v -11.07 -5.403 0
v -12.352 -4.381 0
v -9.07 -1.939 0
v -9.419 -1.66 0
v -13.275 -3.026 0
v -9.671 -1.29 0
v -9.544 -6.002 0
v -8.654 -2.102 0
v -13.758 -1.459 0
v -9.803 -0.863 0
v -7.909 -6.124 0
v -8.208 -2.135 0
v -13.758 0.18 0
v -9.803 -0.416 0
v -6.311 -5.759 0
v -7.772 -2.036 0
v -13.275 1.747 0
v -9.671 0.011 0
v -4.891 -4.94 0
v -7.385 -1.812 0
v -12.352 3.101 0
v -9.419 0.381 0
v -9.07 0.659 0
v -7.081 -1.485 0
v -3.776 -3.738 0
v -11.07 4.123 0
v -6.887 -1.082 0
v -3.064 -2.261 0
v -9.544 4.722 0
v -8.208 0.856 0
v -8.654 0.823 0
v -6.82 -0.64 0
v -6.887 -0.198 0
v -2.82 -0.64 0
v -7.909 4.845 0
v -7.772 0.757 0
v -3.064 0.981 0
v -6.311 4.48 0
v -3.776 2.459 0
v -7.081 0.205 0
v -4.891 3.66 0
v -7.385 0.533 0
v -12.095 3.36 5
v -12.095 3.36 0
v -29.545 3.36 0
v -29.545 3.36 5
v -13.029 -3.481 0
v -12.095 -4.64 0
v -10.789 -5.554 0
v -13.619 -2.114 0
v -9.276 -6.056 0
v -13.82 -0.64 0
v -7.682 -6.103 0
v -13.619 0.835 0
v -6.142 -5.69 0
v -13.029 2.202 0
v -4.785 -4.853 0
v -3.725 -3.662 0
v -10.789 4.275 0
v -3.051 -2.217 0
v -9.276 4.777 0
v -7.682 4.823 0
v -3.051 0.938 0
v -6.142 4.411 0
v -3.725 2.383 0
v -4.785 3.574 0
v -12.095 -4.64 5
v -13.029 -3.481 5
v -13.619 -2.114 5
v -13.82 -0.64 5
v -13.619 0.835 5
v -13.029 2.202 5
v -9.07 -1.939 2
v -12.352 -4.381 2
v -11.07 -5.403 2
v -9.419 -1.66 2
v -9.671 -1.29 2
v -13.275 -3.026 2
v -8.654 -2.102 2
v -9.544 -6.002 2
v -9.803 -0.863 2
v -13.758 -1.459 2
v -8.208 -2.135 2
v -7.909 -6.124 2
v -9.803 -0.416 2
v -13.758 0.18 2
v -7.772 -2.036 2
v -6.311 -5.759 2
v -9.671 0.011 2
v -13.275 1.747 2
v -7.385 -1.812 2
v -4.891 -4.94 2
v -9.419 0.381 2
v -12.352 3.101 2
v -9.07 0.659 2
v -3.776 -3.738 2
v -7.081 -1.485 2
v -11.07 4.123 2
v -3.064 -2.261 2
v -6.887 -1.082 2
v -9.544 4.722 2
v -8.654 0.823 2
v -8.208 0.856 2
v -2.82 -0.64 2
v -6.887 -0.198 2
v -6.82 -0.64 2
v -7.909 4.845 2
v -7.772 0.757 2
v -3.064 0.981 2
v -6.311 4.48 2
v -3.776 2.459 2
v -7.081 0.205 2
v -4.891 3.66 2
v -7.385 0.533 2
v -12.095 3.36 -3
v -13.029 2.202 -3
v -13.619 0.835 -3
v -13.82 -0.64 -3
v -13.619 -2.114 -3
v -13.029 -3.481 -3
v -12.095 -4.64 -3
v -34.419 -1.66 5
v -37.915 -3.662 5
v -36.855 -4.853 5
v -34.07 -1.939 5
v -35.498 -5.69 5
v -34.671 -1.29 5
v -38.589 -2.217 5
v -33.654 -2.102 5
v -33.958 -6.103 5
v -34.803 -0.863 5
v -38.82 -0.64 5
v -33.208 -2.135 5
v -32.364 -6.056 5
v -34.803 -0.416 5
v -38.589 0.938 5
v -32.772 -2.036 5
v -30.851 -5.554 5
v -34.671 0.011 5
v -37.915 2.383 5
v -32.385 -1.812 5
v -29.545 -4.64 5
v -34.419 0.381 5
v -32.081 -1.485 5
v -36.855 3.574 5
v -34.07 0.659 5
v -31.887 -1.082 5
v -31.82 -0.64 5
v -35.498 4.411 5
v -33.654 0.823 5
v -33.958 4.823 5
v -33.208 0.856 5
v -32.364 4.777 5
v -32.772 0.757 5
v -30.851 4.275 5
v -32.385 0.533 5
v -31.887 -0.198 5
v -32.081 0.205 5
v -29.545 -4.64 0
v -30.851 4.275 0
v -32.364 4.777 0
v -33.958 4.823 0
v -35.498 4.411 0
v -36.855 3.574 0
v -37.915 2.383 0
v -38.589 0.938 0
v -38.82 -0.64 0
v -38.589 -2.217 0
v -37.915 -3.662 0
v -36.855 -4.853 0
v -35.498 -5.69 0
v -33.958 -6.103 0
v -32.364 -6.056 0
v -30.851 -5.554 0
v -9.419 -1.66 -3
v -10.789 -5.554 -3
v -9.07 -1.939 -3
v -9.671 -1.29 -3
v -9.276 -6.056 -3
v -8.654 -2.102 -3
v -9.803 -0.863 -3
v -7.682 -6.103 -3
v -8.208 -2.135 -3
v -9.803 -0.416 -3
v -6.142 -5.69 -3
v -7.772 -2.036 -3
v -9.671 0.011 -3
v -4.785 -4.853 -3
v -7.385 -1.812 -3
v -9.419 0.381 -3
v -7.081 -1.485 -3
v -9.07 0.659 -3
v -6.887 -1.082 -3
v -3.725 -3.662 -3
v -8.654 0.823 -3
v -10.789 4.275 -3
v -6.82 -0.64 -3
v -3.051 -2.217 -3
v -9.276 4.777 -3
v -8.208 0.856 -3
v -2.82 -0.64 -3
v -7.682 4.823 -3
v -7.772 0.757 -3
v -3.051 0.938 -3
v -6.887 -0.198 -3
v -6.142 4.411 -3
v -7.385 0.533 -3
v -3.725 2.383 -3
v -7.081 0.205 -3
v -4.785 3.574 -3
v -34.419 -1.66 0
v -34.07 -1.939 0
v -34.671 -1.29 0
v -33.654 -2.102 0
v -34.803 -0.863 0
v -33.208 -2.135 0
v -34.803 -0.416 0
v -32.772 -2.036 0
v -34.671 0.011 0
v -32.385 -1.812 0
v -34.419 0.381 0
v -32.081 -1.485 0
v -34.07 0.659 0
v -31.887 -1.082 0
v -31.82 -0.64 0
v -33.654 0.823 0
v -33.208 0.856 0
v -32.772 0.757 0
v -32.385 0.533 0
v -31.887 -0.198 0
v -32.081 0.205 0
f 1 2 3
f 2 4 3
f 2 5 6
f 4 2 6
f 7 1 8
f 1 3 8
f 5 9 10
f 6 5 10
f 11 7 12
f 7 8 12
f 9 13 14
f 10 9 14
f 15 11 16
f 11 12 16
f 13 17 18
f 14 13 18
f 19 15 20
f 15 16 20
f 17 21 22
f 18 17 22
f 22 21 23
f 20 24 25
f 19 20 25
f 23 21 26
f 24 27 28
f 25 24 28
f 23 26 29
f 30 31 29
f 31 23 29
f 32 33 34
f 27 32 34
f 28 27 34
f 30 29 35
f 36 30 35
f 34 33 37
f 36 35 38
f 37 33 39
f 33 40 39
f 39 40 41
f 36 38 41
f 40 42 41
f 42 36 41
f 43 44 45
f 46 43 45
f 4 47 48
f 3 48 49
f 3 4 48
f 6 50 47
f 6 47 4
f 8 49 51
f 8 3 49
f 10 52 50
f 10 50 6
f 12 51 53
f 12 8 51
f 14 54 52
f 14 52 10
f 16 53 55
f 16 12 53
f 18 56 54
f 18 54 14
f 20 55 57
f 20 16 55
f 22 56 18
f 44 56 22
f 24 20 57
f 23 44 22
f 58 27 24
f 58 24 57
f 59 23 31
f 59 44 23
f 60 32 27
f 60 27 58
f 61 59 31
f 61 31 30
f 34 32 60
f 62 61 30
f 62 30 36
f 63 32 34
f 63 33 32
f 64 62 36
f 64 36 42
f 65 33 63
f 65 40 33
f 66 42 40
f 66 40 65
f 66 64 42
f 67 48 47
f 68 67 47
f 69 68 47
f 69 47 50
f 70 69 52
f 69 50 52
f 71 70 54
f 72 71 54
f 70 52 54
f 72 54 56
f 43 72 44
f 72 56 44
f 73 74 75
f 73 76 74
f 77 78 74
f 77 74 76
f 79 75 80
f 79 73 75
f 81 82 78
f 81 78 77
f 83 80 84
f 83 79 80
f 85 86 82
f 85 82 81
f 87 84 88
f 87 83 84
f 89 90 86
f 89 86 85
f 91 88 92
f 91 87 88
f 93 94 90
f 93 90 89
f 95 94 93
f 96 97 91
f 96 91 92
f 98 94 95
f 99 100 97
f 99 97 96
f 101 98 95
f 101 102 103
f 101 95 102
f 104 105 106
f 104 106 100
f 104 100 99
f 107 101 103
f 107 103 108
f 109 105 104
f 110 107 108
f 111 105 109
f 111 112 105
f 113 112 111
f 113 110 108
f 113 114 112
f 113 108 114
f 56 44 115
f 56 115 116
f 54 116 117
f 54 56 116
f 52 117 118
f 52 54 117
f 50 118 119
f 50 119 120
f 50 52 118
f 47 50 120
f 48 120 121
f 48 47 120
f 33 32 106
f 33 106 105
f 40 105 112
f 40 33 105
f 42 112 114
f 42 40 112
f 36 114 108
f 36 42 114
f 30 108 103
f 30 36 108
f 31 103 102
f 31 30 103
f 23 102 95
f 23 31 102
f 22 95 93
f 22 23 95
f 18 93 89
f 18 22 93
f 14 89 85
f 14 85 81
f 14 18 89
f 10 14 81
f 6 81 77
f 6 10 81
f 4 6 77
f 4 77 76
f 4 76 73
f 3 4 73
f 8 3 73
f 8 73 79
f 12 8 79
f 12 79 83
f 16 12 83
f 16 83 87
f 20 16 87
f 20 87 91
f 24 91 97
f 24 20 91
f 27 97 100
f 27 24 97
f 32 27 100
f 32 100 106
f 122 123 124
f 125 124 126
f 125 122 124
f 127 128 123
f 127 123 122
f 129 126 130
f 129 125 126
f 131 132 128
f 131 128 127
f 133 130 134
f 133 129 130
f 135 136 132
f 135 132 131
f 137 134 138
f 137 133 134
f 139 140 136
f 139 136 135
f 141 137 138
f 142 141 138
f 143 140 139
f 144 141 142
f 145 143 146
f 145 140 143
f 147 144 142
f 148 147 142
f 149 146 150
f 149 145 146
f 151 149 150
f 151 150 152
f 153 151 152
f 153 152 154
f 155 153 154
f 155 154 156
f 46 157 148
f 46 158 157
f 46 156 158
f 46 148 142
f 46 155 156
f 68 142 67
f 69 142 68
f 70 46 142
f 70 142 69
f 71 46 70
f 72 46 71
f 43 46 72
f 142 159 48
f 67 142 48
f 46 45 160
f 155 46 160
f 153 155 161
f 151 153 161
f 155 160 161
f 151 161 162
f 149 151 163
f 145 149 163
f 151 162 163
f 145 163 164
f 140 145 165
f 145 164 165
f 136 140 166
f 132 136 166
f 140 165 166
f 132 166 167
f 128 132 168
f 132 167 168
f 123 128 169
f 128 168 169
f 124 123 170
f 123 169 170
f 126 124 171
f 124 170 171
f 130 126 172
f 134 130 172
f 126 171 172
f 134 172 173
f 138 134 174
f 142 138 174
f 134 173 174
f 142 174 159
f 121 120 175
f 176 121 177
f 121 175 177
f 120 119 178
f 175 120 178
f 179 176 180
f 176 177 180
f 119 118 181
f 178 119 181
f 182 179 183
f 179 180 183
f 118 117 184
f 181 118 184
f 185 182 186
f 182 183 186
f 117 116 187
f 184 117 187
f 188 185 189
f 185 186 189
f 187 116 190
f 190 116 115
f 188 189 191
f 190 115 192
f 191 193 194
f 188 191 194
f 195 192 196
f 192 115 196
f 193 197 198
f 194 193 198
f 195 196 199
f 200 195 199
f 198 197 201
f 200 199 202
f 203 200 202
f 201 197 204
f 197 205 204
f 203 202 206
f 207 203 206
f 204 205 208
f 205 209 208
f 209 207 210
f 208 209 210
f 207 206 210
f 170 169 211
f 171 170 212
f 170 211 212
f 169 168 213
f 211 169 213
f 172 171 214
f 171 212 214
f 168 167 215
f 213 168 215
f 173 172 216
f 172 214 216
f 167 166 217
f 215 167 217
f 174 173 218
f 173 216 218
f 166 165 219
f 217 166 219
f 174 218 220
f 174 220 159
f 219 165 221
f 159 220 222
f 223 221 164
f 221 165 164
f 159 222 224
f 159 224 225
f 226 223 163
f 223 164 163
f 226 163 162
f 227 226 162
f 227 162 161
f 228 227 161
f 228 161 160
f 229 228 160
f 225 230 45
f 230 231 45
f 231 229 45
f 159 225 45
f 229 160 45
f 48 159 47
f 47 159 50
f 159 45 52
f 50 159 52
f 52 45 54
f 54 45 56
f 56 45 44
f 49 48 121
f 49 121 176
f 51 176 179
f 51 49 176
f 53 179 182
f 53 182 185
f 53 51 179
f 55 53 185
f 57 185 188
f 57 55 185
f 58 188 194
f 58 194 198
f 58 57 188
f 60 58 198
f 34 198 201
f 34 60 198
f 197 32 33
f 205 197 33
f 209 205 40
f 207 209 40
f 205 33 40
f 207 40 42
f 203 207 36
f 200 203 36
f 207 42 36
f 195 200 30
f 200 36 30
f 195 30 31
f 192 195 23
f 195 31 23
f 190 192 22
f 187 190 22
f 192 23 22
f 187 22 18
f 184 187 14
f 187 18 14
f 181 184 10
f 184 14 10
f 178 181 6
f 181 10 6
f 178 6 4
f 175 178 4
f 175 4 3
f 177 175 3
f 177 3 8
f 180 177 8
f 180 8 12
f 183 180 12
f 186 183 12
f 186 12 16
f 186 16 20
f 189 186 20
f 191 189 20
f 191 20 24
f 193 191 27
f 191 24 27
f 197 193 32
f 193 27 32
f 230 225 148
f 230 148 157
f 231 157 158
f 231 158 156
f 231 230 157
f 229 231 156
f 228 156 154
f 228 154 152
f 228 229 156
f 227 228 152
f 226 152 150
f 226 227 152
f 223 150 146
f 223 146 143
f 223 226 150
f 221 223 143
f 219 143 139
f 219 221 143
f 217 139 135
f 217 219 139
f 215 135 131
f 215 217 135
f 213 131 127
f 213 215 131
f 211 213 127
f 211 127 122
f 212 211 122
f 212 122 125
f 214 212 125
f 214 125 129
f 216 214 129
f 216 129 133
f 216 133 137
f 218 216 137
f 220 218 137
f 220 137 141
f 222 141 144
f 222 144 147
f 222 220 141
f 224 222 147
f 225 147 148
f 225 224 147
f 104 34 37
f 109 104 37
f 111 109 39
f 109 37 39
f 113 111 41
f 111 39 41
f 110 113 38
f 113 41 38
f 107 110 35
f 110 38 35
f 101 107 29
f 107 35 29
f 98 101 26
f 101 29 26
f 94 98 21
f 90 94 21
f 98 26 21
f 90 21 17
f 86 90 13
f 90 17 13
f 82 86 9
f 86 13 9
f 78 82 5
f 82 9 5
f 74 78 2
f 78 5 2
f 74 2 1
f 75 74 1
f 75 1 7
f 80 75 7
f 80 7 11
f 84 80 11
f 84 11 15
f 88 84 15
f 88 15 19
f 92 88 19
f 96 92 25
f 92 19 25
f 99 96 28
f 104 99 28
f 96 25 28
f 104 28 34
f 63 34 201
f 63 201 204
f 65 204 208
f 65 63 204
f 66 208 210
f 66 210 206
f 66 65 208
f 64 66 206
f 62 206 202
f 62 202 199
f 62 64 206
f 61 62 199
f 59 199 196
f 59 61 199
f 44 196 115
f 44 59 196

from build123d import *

# Parameters (mm, degrees)
F0_R        = 1.5
F1_DEPTH    = 3
F2_DEPTH    = 5
F1_FACE_R   = 5.5
F1_FACE_R_2 = 1.5
F3_DEPTH    = 2


with BuildPart() as f1:
    # F0 (on Top) → F1 (new body)
    with BuildSketch(Plane.XY):
        with BuildLine():
            ThreePointArc((-2.819893, -0.639665), (-6.141825, 4.410683), (-12.09481, 3.360335))
            ThreePointArc((-12.09481, 3.360335), (-13.819893, -0.639665), (-12.09481, -4.639665))
            ThreePointArc((-12.09481, -4.639665), (-6.141825, -5.690014), (-2.819893, -0.639665))
        make_face()
        with Locations((-8.319893, -0.639665)):
            Circle(F0_R, mode=Mode.SUBTRACT)
    extrude(amount=-F1_DEPTH)


with BuildPart() as f2:
    # F0 (on Top) → F2 (new body)
    with BuildSketch(Plane.XY):
        with BuildLine():
            ThreePointArc((-29.544975, 3.360335), (-28.269544, 1.538402), (-27.819893, -0.639665))
            ThreePointArc((-27.819893, -0.639665), (-28.269544, -2.817733), (-29.544975, -4.639665))
            Line((-29.544975, -4.639665), (-29.319893, -4.639665))
            Line((-29.319893, -4.639665), (-12.319893, -4.639665))
            Line((-12.319893, -4.639665), (-12.09481, -4.639665))
            ThreePointArc((-12.09481, -4.639665), (-13.819893, -0.639665), (-12.09481, 3.360335))
            Line((-12.09481, 3.360335), (-12.319893, 3.360335))
            Line((-12.319893, 3.360335), (-29.319893, 3.360335))
            Line((-29.319893, 3.360335), (-29.544975, 3.360335))
        make_face()
        with BuildLine():
            ThreePointArc((-29.544975, -4.639665), (-28.269544, -2.817733), (-27.819893, -0.639665))
            ThreePointArc((-27.819893, -0.639665), (-28.269544, 1.538402), (-29.544975, 3.360335))
            ThreePointArc((-29.544975, 3.360335), (-38.819893, -0.639665), (-29.544975, -4.639665))
        make_face()
        with Locations((-33.319893, -0.639665)):
            Circle(F0_R, mode=Mode.SUBTRACT)
    extrude(amount=F2_DEPTH)


with BuildPart() as f3:
    # F1_face (on face) → F3 (new body)
    with BuildSketch(Plane(origin=(-8.319893, -0.639665, 0), x_dir=(1, 0, 0), z_dir=(0, 0, 1))):
        Circle(F1_FACE_R)
        Circle(F1_FACE_R_2, mode=Mode.SUBTRACT)
    extrude(amount=F3_DEPTH)


solid = Compound([f1.part, f2.part, f3.part])
